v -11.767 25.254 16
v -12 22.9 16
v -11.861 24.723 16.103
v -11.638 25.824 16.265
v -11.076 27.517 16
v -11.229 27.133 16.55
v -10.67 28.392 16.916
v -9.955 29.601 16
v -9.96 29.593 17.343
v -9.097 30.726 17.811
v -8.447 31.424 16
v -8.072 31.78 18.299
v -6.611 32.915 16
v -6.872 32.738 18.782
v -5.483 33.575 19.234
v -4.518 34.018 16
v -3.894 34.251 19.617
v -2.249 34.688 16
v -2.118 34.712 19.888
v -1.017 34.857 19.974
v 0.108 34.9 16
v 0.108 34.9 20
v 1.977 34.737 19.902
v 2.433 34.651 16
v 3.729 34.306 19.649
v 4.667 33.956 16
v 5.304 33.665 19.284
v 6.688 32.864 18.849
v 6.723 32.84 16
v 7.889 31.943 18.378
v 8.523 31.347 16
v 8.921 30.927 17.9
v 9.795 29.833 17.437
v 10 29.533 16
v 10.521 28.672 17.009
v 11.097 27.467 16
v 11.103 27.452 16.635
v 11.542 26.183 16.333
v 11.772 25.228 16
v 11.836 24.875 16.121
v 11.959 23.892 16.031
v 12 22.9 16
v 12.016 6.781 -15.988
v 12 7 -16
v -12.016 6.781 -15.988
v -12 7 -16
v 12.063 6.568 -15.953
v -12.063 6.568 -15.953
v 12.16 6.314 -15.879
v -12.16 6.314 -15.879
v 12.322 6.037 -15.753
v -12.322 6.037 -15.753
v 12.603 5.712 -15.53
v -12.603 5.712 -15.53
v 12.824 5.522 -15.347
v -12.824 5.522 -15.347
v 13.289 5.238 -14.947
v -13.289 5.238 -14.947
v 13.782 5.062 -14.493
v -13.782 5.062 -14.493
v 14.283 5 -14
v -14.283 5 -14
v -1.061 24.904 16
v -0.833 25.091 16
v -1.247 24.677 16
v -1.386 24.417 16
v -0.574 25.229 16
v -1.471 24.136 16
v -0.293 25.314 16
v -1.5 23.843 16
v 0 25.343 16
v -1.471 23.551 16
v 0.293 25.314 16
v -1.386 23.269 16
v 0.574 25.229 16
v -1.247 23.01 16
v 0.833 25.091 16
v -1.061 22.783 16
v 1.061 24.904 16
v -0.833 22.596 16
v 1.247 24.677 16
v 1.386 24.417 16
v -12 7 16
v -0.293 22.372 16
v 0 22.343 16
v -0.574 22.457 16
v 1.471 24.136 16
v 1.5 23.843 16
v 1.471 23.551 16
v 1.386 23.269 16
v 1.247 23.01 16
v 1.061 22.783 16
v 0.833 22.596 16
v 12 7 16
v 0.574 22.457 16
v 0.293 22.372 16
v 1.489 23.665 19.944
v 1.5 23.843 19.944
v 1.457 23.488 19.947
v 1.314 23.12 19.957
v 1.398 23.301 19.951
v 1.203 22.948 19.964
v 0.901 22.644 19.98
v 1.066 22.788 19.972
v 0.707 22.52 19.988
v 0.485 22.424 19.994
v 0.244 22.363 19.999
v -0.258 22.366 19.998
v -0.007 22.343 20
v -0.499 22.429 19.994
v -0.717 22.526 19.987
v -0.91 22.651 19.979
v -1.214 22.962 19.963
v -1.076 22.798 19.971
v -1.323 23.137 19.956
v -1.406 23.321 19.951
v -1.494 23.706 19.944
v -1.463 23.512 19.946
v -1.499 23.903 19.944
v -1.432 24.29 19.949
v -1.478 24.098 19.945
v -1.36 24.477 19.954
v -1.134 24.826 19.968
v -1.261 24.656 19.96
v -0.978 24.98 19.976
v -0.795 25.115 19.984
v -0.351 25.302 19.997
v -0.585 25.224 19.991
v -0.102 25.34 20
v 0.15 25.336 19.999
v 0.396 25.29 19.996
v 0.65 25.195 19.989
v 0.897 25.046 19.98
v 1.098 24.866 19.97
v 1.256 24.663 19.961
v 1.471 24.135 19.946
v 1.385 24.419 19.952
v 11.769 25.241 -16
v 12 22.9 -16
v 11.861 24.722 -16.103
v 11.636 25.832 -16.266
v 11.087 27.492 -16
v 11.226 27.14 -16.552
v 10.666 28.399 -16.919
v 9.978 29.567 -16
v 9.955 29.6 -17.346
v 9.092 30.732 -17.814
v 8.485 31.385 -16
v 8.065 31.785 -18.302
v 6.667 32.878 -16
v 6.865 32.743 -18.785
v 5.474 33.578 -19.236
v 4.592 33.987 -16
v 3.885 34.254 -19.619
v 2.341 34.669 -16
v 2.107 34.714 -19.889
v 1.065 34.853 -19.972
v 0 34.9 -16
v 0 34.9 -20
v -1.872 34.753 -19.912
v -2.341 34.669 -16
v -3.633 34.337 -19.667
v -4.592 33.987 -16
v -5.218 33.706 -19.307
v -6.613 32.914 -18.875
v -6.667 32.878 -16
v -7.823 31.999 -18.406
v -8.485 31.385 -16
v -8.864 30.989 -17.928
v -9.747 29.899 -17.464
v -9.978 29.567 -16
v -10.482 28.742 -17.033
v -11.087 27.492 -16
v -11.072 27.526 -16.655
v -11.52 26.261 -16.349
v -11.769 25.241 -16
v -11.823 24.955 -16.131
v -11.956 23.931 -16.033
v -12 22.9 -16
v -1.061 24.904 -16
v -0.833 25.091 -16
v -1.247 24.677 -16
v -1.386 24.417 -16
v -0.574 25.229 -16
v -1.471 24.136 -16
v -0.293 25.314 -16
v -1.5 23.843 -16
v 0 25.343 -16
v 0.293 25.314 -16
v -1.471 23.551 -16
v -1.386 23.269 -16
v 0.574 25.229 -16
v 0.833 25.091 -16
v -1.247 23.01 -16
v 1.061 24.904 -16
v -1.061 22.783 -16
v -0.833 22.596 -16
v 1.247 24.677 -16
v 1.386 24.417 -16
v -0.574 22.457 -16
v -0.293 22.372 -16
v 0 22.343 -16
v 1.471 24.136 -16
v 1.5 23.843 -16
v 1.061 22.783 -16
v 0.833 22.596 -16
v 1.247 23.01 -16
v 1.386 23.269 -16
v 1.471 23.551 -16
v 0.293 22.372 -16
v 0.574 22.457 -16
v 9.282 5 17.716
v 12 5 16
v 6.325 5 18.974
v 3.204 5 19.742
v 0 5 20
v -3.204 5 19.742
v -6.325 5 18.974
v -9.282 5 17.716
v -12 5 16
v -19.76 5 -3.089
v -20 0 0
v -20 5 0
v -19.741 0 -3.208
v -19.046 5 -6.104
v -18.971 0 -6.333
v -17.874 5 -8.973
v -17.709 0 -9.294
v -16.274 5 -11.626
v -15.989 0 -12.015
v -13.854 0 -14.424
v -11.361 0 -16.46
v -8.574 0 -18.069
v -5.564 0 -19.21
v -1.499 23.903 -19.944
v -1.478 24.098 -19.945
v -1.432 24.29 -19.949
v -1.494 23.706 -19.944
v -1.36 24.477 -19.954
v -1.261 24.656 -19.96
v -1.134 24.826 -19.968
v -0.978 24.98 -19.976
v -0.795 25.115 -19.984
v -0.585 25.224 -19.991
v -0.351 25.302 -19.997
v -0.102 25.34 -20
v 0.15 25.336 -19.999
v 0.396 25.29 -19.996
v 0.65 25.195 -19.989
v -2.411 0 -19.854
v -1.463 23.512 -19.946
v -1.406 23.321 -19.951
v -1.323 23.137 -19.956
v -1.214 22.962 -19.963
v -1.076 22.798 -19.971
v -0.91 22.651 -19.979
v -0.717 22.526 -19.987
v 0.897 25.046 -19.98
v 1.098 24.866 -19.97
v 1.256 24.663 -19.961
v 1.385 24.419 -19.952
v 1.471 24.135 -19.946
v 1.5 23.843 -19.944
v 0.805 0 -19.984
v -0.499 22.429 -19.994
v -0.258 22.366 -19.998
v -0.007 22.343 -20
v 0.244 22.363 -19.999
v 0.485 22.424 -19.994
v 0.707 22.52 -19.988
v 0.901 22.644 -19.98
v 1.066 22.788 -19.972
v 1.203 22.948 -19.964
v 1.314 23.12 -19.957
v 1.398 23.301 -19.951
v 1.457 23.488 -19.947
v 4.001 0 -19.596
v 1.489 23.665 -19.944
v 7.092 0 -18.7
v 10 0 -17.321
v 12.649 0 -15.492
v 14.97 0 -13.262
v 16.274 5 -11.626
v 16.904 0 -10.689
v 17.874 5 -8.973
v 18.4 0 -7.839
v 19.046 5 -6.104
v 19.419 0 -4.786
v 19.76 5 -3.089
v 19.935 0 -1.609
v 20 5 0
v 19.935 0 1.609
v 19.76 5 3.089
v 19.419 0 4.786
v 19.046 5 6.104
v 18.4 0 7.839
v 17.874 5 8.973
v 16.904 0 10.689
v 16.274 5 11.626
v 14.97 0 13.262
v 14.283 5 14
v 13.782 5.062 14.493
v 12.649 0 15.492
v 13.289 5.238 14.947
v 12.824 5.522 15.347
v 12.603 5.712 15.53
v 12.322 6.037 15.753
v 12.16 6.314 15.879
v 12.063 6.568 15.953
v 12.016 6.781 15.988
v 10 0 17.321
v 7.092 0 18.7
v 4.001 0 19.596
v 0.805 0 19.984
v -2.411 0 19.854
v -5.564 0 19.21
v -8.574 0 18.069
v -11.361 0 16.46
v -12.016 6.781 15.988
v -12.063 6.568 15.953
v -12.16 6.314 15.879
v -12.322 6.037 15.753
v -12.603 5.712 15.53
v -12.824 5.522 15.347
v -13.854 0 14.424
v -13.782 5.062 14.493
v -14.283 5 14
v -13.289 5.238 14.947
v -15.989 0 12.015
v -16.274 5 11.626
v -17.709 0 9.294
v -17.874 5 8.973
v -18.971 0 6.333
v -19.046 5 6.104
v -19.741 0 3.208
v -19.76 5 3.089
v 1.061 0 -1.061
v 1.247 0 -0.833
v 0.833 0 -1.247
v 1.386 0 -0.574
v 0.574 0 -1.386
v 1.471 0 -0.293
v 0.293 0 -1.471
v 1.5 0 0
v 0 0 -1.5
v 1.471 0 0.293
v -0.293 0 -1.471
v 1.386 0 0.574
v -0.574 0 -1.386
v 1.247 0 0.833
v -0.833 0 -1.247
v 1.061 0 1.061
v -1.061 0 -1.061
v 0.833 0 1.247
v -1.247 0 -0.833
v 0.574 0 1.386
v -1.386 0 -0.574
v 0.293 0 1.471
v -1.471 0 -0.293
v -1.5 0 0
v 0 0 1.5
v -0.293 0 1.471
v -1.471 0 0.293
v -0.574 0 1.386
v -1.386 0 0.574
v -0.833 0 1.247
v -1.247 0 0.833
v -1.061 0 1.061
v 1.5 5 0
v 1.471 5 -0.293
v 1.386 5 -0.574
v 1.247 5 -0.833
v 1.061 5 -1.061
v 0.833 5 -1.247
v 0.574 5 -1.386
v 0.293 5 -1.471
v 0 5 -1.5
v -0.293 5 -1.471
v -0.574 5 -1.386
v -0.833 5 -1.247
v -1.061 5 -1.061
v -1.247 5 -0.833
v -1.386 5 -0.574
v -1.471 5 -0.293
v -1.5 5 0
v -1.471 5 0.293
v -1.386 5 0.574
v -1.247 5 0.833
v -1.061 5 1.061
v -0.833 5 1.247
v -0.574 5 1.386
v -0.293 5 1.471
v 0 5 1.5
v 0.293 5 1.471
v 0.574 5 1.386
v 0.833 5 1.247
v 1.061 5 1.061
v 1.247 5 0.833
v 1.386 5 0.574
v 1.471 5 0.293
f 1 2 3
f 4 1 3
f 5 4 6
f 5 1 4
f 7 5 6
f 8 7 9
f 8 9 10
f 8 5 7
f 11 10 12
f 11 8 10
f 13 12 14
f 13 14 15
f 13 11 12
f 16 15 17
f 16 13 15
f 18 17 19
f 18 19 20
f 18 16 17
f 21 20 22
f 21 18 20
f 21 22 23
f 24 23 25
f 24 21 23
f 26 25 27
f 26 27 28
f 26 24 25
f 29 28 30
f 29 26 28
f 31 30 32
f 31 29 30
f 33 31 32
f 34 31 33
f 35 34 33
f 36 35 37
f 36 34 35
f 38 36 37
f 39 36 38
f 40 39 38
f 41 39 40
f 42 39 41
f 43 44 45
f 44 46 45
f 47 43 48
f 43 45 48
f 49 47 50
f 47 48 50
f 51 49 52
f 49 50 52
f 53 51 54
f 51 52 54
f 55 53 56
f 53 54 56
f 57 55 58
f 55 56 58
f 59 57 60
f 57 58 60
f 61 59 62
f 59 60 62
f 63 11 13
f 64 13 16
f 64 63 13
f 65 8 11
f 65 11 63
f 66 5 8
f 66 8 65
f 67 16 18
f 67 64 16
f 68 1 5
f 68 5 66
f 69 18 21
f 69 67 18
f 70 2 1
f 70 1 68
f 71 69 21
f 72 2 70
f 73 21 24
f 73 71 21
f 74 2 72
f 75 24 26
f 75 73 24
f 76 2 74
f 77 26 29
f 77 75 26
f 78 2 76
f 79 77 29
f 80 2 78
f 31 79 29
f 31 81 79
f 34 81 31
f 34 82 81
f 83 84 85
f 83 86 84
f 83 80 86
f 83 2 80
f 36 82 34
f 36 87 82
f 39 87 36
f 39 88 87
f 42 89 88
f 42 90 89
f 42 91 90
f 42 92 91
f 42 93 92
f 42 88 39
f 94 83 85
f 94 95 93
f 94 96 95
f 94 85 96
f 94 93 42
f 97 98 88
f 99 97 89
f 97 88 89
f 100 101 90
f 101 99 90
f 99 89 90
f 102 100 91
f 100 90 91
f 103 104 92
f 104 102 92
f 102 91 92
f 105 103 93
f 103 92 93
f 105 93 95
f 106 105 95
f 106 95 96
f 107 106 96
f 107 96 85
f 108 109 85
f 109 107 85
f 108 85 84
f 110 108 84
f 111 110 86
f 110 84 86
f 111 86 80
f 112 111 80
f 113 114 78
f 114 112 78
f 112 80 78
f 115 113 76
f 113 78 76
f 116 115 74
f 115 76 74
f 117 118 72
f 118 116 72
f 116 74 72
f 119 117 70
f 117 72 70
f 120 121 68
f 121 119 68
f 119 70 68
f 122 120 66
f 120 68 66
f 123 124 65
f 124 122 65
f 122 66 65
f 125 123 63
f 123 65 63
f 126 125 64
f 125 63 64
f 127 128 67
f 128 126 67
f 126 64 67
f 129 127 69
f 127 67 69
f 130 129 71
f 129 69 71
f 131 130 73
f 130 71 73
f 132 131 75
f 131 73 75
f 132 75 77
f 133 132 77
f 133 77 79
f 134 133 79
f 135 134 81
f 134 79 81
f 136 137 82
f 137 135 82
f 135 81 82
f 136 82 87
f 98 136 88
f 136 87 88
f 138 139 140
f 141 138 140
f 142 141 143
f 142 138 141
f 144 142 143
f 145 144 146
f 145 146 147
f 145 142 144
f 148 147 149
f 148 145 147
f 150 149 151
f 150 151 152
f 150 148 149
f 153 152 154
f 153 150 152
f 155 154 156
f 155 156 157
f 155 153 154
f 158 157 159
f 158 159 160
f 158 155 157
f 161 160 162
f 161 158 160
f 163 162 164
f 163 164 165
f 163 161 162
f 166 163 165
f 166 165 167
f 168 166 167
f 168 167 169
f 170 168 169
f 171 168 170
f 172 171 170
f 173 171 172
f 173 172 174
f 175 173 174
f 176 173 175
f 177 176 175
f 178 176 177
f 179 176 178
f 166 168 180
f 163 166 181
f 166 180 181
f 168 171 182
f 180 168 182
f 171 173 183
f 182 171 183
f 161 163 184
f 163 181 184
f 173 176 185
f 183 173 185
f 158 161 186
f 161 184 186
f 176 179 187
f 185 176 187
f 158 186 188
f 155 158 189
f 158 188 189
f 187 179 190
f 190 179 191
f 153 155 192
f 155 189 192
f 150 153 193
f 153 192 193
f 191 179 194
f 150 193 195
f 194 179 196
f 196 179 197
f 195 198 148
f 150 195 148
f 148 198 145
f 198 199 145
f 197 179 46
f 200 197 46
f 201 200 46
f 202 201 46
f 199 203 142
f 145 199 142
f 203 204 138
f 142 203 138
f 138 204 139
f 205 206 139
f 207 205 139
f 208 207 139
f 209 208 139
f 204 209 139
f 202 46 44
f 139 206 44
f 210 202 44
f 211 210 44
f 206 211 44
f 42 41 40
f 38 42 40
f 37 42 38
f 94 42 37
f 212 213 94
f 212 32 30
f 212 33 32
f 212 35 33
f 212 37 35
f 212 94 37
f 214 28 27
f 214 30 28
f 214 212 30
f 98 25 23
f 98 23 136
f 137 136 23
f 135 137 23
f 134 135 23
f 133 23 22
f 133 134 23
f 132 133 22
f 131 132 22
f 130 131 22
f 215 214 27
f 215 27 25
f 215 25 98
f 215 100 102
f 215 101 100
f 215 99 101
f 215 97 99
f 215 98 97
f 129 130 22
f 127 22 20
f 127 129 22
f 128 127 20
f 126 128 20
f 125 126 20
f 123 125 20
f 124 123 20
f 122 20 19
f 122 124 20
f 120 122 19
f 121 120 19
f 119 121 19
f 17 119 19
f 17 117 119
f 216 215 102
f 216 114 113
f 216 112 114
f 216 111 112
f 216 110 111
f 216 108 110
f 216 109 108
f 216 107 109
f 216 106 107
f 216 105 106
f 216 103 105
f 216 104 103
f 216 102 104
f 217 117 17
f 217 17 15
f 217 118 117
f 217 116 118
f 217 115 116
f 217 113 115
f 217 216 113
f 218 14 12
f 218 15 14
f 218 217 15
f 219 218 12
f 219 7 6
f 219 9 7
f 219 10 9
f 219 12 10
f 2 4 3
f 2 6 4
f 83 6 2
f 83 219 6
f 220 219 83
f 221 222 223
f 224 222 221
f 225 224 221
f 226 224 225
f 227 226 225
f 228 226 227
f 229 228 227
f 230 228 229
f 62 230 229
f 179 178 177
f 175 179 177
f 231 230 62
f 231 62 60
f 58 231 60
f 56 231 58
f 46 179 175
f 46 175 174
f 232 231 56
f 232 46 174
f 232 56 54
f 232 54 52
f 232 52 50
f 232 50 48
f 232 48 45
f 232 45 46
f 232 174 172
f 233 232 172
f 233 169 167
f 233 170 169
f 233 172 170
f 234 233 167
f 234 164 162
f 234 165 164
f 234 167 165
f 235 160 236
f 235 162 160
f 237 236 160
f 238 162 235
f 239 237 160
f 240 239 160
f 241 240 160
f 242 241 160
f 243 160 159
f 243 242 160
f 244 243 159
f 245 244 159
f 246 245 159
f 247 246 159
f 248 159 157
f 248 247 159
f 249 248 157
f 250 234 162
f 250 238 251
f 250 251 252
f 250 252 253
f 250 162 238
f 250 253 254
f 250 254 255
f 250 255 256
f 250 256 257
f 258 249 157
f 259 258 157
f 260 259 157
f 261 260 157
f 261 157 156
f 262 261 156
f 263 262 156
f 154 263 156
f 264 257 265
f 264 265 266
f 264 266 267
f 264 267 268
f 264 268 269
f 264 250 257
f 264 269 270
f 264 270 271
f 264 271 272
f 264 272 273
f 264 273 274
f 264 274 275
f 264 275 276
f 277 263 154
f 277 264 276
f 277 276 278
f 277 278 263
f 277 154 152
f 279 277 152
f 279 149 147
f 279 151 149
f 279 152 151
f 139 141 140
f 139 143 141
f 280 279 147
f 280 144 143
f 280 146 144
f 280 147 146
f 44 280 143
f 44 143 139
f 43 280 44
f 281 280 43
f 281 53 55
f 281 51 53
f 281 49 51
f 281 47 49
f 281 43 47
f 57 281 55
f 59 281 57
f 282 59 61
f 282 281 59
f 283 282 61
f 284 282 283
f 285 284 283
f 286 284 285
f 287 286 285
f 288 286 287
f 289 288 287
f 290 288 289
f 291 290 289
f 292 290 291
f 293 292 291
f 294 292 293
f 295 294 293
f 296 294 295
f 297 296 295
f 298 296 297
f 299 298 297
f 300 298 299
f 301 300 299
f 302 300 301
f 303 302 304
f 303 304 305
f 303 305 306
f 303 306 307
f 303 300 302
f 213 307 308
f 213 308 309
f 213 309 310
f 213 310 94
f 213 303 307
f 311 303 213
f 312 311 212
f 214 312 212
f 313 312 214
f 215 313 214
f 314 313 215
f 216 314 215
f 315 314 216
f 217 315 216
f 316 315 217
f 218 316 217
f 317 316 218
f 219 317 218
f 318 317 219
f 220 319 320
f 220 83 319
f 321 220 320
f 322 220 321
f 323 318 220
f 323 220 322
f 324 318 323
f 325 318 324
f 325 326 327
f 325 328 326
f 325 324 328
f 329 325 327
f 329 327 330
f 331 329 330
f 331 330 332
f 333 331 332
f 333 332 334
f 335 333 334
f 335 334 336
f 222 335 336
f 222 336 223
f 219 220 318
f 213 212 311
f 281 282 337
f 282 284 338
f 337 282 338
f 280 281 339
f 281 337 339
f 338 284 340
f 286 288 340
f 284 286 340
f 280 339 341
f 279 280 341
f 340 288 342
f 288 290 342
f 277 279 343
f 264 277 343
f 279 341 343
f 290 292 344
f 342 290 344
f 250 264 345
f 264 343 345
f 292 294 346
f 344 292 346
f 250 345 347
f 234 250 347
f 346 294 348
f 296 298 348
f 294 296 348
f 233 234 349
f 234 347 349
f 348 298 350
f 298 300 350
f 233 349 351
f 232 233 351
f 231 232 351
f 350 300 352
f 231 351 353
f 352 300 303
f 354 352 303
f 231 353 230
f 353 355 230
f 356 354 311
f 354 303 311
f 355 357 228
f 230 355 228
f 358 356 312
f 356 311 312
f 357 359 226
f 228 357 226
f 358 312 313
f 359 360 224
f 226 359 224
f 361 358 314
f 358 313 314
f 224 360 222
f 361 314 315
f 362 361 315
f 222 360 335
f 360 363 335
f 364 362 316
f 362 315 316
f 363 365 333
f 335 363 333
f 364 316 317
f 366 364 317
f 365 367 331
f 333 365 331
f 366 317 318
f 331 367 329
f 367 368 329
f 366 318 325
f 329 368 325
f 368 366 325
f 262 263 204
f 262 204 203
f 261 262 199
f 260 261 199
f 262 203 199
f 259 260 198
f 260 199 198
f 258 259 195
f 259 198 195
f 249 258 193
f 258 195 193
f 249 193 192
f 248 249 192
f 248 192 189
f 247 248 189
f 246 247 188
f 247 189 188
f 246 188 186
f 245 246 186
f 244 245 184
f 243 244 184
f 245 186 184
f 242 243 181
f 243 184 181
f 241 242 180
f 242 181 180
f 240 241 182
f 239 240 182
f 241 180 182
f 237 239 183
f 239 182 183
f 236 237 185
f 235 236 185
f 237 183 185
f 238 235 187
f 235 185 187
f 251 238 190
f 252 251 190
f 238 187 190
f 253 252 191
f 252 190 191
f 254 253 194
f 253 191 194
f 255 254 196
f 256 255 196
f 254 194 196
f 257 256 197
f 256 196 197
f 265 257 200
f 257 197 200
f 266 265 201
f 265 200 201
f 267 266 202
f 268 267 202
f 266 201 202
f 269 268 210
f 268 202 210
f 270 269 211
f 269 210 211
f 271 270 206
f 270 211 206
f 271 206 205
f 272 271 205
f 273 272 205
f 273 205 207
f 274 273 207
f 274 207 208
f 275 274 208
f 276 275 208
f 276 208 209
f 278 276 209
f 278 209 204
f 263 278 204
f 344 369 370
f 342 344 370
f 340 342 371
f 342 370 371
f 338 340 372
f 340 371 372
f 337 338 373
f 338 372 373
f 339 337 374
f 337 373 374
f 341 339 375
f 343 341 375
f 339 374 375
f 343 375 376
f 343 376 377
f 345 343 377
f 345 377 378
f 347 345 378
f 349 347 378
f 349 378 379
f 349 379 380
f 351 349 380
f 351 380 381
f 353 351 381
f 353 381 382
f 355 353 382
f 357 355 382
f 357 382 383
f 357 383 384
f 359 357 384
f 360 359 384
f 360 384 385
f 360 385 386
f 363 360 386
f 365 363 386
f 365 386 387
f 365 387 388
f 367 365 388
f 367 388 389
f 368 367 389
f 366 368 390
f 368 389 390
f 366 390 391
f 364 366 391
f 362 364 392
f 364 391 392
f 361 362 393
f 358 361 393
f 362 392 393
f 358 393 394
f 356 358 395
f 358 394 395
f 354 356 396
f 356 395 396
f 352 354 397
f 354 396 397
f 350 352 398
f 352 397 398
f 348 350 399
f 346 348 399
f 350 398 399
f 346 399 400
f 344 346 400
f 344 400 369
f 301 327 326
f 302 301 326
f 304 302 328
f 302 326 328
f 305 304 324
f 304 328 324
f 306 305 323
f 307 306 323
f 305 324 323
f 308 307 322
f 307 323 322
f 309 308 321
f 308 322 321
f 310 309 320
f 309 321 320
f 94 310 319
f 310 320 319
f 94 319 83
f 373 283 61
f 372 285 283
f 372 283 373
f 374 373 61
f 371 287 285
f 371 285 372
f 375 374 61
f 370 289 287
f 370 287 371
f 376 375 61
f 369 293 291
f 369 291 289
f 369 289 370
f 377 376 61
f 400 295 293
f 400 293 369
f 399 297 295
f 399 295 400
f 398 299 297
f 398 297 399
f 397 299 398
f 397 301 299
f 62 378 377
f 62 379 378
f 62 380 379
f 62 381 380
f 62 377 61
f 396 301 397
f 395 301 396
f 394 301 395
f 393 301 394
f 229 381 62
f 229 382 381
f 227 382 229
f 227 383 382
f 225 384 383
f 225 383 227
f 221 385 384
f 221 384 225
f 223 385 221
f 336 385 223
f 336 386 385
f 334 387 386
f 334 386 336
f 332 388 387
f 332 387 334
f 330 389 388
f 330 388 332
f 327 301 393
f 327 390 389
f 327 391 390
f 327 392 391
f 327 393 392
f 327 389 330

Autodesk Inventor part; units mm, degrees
ref_plane "YZ Plane" through (0, 0, 0) normal (1, 0, 0) x (0, 1, 0)
ref_plane "XZ Plane" through (0, 0, 0) normal (0, 1, 0) x (-1, 0, 0)
ref_plane "XY Plane" through (0, 0, 0) normal (0, 0, 1) x (1, 0, 0)
sketch "Sketch1" plane through (0, 0, 0) normal (0, 1, 0) x (-1, 0, 0)
  circle A0 centre (0, 0) radius 20
  dimension "d0" = 40
extrude "Extrusion1" add sketch "Sketch1" along normal blind 5
sketch "Sketch2" plane through (0, 5, 0) normal (0, 1, 0) x (1, 0, 0)
  circle A0 centre (0, 0) radius 20 projected
  line L0 (-12, 16) -> (12, 16)
  line L1 (-12, -16) -> (12, -16)
  dimension "d3" = 4
  dimension "d4" = 4
extrude "Extrusion2" add sketch "Sketch2" along normal blind 30 contours L0 A0 | A0 L1
sketch "Sketch4" plane through (12, 5, 16) normal (0, 0, -1) x (-1, 0, 0)
  line L0 (24, 30) -> (24, 17.9)
  line L1 (0, 30) -> (0, 17.9)
  arc A0 (11.8923, 29.9) -> (0, 17.9) centre (12, 17.9005) ccw
  arc A1 (24, 17.9) -> (11.8923, 29.9) centre (12, 17.9005) ccw
  line L2 (0, 30) -> (24, 30)
  point P0 (12, -5)
  dimension "d10" = 12.1
  dimension "d11" = 12.1
  dimension "d12" = 12
  dimension "d13" = 12
extrude "Extrusion3" cut sketch "Sketch4" against normal blind 25
sketch "Sketch5" plane through (-12, 5, -16) normal (0, 0, 1) x (1, 0, 0)
  line L0 (24, 30) -> (24, 17.9)
  line L1 (0, 30) -> (0, 17.9)
  arc A0 (12, 29.9) -> (0, 17.9) centre (12, 17.9) ccw
  arc A1 (24, 17.9) -> (12, 29.9) centre (12, 17.9) ccw
  line L2 (24, 30) -> (0, 30) projected
  line L3 (0, 30) -> (24, 30)
  point P0 (12, -5)
  dimension "d16" = 12.1
  dimension "d17" = 12.1
  dimension "d18" = 12
  dimension "d19" = 12
extrude "Extrusion4" cut sketch "Sketch5" against normal blind 25
sketch "Sketch6" plane through (-12, 5, -16) normal (0, 0, 1) x (1, 0, 0)
  circle A0 centre (12, 18.8433) radius 1.5
  line L0 (0, 0) -> (0, 18.8433)
  line L1 (0, 18.8433) -> (23.891, 18.8433)
  point P0 (12, -5)
  dimension "d22" = 3
  dimension "d23" = 12
  dimension "d24" = 0
extrude "Extrusion5" cut sketch "Sketch6" along normal mid plane 500
fillet "Fillet1" radius 2 2 edges at (0, 5, 16) (0, 5, -16)
sketch "Sketch7" plane through (0, 5, 0) normal (0, 1, 0) x (1, 0, 0)
  circle A0 centre (0, 0) radius 1.5
  dimension "d28" = 3
extrude "Extrusion6" cut sketch "Sketch7" against normal blind 10
properties part number "hlava"
